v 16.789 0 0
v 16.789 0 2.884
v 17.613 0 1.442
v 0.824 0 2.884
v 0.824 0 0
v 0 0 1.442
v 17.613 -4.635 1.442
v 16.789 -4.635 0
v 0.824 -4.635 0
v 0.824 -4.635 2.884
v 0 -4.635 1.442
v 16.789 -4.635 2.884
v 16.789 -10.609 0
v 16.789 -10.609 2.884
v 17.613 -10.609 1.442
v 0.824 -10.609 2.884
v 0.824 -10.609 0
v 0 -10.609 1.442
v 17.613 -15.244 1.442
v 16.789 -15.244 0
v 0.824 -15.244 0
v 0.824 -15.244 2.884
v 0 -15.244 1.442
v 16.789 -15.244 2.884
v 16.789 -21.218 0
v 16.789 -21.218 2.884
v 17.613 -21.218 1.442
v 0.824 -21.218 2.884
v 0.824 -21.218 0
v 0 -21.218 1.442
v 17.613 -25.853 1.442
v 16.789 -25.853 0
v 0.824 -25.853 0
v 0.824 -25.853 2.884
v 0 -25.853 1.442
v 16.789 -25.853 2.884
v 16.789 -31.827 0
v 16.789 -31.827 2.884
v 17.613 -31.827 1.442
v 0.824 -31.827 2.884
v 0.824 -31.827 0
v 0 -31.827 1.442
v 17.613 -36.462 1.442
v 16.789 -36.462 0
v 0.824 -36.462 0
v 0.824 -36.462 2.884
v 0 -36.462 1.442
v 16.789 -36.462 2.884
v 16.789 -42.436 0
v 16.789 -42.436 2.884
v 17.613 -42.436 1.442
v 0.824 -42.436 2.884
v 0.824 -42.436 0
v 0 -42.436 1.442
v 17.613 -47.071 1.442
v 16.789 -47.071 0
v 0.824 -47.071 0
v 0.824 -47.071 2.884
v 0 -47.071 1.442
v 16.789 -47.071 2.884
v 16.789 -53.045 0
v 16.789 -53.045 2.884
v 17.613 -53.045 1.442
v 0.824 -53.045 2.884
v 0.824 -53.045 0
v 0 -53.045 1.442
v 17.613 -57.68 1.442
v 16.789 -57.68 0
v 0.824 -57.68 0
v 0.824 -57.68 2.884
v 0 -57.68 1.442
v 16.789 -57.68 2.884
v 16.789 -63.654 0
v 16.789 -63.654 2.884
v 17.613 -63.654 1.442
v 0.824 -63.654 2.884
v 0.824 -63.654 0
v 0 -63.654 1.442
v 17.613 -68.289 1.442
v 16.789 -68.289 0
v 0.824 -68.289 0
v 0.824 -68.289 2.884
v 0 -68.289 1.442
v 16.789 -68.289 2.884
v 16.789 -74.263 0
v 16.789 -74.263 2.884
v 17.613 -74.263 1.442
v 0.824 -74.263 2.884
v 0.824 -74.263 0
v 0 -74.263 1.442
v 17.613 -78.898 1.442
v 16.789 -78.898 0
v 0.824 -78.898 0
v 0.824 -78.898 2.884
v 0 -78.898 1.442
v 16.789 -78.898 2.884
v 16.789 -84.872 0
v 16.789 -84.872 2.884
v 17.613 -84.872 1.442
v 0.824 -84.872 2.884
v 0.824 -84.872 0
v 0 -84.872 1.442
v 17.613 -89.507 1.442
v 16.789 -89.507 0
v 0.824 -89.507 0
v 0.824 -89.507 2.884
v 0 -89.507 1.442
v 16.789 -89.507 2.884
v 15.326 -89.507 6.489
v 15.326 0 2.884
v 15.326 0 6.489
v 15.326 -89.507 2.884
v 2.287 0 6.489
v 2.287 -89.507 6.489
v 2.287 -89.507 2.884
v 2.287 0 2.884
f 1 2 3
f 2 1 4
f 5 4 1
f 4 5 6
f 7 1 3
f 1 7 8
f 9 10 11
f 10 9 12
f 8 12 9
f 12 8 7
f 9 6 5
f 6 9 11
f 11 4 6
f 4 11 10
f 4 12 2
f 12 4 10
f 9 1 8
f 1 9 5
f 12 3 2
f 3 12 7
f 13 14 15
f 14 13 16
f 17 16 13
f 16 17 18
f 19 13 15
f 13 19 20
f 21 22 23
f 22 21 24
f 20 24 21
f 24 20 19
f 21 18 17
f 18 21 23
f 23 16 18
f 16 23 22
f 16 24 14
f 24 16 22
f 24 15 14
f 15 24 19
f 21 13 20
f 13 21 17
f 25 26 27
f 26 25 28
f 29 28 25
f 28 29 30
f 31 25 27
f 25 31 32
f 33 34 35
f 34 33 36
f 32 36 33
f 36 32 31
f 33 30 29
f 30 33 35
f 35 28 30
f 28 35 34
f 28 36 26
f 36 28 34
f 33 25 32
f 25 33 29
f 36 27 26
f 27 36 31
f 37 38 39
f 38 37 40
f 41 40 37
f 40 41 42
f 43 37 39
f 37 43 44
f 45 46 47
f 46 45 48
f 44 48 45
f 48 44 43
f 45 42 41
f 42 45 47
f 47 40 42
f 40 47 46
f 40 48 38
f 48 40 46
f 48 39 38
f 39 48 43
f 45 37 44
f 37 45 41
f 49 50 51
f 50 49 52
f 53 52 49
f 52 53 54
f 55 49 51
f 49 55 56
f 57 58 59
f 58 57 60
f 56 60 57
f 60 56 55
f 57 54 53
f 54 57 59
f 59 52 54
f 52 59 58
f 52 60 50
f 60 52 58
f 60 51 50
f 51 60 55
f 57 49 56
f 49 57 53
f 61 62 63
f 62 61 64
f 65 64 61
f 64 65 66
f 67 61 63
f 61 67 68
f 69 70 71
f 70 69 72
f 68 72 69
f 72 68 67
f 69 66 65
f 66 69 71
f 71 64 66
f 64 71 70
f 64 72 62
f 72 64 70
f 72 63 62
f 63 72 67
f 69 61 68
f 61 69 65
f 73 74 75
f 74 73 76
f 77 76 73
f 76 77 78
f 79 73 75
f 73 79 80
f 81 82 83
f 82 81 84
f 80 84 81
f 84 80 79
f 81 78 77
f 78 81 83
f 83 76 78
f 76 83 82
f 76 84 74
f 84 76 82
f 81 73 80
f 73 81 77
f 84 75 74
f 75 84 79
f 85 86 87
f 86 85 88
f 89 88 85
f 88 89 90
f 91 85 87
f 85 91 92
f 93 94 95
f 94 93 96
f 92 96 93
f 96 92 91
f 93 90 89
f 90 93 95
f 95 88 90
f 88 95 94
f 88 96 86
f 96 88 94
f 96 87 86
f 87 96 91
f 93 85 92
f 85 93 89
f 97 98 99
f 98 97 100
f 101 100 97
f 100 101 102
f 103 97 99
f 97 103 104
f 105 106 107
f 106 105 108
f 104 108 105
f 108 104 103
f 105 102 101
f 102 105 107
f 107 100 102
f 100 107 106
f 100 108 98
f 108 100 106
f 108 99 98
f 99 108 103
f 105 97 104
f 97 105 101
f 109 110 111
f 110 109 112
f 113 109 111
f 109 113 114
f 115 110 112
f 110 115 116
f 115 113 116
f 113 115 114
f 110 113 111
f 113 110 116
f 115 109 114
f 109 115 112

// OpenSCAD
//Width of flat part of the top
top_w1=15.5;
//Width of the top, from point to point
top_w2=17.1;
//Depth of the upper part
top_d=4.5;
//Height of the top part
top_h=2.8;
//Width of the bottom of the rail
bottom_w=12.66;
//Height of the bottom of the rail
bottom_h=3.5;
//Depth of the slot between 
slot_d=5.8;
//Maximum length, 
max_l = 98;

//extra size for plastic shrinkage
resize_factor=1.03; 

/* [Hidden] */
htop_w1=top_w1*resize_factor;
htop_w2=top_w2*resize_factor;
htop_h=top_h*resize_factor;
hbottom_w=bottom_w*resize_factor;
hbottom_h=bottom_h*resize_factor;
hrib_d=top_d*resize_factor;
hslot_d=slot_d*resize_factor;

//Sutract one "rib" then divide by rib+slot to determine the total
//number of ribs we can "fit" in the given distance (so that we
//start and end with a rib)
num_ribs = floor((max_l - hrib_d) / (hrib_d + hslot_d));
overall_l = (num_ribs) * (hrib_d + hslot_d) + hrib_d;


module rib() {
    pw = 0.5 * (htop_w2 - htop_w1);
    pts =[ [0, 0.5 * htop_h], 
           [ pw, 0], 
           [ htop_w2 - pw, 0], 
           [htop_w2, 0.5 * htop_h], 
           [htop_w2 - pw, htop_h],
           [pw, htop_h] 
         ];
    linear_extrude(height=hrib_d,convexity=2)
        polygon(points=pts, convexity=2);
}

union() {
    //note that this does an "extra" rib - the first one 
    for (i = [0 : num_ribs] ) {
        translate([0,-i* (hrib_d + hslot_d),0])
        rotate([90,0,0])
            rib();
    }
    translate([0.5 * (htop_w2 - hbottom_w),-1*(overall_l),htop_h])
    cube([hbottom_w, overall_l, hbottom_h]);
}
